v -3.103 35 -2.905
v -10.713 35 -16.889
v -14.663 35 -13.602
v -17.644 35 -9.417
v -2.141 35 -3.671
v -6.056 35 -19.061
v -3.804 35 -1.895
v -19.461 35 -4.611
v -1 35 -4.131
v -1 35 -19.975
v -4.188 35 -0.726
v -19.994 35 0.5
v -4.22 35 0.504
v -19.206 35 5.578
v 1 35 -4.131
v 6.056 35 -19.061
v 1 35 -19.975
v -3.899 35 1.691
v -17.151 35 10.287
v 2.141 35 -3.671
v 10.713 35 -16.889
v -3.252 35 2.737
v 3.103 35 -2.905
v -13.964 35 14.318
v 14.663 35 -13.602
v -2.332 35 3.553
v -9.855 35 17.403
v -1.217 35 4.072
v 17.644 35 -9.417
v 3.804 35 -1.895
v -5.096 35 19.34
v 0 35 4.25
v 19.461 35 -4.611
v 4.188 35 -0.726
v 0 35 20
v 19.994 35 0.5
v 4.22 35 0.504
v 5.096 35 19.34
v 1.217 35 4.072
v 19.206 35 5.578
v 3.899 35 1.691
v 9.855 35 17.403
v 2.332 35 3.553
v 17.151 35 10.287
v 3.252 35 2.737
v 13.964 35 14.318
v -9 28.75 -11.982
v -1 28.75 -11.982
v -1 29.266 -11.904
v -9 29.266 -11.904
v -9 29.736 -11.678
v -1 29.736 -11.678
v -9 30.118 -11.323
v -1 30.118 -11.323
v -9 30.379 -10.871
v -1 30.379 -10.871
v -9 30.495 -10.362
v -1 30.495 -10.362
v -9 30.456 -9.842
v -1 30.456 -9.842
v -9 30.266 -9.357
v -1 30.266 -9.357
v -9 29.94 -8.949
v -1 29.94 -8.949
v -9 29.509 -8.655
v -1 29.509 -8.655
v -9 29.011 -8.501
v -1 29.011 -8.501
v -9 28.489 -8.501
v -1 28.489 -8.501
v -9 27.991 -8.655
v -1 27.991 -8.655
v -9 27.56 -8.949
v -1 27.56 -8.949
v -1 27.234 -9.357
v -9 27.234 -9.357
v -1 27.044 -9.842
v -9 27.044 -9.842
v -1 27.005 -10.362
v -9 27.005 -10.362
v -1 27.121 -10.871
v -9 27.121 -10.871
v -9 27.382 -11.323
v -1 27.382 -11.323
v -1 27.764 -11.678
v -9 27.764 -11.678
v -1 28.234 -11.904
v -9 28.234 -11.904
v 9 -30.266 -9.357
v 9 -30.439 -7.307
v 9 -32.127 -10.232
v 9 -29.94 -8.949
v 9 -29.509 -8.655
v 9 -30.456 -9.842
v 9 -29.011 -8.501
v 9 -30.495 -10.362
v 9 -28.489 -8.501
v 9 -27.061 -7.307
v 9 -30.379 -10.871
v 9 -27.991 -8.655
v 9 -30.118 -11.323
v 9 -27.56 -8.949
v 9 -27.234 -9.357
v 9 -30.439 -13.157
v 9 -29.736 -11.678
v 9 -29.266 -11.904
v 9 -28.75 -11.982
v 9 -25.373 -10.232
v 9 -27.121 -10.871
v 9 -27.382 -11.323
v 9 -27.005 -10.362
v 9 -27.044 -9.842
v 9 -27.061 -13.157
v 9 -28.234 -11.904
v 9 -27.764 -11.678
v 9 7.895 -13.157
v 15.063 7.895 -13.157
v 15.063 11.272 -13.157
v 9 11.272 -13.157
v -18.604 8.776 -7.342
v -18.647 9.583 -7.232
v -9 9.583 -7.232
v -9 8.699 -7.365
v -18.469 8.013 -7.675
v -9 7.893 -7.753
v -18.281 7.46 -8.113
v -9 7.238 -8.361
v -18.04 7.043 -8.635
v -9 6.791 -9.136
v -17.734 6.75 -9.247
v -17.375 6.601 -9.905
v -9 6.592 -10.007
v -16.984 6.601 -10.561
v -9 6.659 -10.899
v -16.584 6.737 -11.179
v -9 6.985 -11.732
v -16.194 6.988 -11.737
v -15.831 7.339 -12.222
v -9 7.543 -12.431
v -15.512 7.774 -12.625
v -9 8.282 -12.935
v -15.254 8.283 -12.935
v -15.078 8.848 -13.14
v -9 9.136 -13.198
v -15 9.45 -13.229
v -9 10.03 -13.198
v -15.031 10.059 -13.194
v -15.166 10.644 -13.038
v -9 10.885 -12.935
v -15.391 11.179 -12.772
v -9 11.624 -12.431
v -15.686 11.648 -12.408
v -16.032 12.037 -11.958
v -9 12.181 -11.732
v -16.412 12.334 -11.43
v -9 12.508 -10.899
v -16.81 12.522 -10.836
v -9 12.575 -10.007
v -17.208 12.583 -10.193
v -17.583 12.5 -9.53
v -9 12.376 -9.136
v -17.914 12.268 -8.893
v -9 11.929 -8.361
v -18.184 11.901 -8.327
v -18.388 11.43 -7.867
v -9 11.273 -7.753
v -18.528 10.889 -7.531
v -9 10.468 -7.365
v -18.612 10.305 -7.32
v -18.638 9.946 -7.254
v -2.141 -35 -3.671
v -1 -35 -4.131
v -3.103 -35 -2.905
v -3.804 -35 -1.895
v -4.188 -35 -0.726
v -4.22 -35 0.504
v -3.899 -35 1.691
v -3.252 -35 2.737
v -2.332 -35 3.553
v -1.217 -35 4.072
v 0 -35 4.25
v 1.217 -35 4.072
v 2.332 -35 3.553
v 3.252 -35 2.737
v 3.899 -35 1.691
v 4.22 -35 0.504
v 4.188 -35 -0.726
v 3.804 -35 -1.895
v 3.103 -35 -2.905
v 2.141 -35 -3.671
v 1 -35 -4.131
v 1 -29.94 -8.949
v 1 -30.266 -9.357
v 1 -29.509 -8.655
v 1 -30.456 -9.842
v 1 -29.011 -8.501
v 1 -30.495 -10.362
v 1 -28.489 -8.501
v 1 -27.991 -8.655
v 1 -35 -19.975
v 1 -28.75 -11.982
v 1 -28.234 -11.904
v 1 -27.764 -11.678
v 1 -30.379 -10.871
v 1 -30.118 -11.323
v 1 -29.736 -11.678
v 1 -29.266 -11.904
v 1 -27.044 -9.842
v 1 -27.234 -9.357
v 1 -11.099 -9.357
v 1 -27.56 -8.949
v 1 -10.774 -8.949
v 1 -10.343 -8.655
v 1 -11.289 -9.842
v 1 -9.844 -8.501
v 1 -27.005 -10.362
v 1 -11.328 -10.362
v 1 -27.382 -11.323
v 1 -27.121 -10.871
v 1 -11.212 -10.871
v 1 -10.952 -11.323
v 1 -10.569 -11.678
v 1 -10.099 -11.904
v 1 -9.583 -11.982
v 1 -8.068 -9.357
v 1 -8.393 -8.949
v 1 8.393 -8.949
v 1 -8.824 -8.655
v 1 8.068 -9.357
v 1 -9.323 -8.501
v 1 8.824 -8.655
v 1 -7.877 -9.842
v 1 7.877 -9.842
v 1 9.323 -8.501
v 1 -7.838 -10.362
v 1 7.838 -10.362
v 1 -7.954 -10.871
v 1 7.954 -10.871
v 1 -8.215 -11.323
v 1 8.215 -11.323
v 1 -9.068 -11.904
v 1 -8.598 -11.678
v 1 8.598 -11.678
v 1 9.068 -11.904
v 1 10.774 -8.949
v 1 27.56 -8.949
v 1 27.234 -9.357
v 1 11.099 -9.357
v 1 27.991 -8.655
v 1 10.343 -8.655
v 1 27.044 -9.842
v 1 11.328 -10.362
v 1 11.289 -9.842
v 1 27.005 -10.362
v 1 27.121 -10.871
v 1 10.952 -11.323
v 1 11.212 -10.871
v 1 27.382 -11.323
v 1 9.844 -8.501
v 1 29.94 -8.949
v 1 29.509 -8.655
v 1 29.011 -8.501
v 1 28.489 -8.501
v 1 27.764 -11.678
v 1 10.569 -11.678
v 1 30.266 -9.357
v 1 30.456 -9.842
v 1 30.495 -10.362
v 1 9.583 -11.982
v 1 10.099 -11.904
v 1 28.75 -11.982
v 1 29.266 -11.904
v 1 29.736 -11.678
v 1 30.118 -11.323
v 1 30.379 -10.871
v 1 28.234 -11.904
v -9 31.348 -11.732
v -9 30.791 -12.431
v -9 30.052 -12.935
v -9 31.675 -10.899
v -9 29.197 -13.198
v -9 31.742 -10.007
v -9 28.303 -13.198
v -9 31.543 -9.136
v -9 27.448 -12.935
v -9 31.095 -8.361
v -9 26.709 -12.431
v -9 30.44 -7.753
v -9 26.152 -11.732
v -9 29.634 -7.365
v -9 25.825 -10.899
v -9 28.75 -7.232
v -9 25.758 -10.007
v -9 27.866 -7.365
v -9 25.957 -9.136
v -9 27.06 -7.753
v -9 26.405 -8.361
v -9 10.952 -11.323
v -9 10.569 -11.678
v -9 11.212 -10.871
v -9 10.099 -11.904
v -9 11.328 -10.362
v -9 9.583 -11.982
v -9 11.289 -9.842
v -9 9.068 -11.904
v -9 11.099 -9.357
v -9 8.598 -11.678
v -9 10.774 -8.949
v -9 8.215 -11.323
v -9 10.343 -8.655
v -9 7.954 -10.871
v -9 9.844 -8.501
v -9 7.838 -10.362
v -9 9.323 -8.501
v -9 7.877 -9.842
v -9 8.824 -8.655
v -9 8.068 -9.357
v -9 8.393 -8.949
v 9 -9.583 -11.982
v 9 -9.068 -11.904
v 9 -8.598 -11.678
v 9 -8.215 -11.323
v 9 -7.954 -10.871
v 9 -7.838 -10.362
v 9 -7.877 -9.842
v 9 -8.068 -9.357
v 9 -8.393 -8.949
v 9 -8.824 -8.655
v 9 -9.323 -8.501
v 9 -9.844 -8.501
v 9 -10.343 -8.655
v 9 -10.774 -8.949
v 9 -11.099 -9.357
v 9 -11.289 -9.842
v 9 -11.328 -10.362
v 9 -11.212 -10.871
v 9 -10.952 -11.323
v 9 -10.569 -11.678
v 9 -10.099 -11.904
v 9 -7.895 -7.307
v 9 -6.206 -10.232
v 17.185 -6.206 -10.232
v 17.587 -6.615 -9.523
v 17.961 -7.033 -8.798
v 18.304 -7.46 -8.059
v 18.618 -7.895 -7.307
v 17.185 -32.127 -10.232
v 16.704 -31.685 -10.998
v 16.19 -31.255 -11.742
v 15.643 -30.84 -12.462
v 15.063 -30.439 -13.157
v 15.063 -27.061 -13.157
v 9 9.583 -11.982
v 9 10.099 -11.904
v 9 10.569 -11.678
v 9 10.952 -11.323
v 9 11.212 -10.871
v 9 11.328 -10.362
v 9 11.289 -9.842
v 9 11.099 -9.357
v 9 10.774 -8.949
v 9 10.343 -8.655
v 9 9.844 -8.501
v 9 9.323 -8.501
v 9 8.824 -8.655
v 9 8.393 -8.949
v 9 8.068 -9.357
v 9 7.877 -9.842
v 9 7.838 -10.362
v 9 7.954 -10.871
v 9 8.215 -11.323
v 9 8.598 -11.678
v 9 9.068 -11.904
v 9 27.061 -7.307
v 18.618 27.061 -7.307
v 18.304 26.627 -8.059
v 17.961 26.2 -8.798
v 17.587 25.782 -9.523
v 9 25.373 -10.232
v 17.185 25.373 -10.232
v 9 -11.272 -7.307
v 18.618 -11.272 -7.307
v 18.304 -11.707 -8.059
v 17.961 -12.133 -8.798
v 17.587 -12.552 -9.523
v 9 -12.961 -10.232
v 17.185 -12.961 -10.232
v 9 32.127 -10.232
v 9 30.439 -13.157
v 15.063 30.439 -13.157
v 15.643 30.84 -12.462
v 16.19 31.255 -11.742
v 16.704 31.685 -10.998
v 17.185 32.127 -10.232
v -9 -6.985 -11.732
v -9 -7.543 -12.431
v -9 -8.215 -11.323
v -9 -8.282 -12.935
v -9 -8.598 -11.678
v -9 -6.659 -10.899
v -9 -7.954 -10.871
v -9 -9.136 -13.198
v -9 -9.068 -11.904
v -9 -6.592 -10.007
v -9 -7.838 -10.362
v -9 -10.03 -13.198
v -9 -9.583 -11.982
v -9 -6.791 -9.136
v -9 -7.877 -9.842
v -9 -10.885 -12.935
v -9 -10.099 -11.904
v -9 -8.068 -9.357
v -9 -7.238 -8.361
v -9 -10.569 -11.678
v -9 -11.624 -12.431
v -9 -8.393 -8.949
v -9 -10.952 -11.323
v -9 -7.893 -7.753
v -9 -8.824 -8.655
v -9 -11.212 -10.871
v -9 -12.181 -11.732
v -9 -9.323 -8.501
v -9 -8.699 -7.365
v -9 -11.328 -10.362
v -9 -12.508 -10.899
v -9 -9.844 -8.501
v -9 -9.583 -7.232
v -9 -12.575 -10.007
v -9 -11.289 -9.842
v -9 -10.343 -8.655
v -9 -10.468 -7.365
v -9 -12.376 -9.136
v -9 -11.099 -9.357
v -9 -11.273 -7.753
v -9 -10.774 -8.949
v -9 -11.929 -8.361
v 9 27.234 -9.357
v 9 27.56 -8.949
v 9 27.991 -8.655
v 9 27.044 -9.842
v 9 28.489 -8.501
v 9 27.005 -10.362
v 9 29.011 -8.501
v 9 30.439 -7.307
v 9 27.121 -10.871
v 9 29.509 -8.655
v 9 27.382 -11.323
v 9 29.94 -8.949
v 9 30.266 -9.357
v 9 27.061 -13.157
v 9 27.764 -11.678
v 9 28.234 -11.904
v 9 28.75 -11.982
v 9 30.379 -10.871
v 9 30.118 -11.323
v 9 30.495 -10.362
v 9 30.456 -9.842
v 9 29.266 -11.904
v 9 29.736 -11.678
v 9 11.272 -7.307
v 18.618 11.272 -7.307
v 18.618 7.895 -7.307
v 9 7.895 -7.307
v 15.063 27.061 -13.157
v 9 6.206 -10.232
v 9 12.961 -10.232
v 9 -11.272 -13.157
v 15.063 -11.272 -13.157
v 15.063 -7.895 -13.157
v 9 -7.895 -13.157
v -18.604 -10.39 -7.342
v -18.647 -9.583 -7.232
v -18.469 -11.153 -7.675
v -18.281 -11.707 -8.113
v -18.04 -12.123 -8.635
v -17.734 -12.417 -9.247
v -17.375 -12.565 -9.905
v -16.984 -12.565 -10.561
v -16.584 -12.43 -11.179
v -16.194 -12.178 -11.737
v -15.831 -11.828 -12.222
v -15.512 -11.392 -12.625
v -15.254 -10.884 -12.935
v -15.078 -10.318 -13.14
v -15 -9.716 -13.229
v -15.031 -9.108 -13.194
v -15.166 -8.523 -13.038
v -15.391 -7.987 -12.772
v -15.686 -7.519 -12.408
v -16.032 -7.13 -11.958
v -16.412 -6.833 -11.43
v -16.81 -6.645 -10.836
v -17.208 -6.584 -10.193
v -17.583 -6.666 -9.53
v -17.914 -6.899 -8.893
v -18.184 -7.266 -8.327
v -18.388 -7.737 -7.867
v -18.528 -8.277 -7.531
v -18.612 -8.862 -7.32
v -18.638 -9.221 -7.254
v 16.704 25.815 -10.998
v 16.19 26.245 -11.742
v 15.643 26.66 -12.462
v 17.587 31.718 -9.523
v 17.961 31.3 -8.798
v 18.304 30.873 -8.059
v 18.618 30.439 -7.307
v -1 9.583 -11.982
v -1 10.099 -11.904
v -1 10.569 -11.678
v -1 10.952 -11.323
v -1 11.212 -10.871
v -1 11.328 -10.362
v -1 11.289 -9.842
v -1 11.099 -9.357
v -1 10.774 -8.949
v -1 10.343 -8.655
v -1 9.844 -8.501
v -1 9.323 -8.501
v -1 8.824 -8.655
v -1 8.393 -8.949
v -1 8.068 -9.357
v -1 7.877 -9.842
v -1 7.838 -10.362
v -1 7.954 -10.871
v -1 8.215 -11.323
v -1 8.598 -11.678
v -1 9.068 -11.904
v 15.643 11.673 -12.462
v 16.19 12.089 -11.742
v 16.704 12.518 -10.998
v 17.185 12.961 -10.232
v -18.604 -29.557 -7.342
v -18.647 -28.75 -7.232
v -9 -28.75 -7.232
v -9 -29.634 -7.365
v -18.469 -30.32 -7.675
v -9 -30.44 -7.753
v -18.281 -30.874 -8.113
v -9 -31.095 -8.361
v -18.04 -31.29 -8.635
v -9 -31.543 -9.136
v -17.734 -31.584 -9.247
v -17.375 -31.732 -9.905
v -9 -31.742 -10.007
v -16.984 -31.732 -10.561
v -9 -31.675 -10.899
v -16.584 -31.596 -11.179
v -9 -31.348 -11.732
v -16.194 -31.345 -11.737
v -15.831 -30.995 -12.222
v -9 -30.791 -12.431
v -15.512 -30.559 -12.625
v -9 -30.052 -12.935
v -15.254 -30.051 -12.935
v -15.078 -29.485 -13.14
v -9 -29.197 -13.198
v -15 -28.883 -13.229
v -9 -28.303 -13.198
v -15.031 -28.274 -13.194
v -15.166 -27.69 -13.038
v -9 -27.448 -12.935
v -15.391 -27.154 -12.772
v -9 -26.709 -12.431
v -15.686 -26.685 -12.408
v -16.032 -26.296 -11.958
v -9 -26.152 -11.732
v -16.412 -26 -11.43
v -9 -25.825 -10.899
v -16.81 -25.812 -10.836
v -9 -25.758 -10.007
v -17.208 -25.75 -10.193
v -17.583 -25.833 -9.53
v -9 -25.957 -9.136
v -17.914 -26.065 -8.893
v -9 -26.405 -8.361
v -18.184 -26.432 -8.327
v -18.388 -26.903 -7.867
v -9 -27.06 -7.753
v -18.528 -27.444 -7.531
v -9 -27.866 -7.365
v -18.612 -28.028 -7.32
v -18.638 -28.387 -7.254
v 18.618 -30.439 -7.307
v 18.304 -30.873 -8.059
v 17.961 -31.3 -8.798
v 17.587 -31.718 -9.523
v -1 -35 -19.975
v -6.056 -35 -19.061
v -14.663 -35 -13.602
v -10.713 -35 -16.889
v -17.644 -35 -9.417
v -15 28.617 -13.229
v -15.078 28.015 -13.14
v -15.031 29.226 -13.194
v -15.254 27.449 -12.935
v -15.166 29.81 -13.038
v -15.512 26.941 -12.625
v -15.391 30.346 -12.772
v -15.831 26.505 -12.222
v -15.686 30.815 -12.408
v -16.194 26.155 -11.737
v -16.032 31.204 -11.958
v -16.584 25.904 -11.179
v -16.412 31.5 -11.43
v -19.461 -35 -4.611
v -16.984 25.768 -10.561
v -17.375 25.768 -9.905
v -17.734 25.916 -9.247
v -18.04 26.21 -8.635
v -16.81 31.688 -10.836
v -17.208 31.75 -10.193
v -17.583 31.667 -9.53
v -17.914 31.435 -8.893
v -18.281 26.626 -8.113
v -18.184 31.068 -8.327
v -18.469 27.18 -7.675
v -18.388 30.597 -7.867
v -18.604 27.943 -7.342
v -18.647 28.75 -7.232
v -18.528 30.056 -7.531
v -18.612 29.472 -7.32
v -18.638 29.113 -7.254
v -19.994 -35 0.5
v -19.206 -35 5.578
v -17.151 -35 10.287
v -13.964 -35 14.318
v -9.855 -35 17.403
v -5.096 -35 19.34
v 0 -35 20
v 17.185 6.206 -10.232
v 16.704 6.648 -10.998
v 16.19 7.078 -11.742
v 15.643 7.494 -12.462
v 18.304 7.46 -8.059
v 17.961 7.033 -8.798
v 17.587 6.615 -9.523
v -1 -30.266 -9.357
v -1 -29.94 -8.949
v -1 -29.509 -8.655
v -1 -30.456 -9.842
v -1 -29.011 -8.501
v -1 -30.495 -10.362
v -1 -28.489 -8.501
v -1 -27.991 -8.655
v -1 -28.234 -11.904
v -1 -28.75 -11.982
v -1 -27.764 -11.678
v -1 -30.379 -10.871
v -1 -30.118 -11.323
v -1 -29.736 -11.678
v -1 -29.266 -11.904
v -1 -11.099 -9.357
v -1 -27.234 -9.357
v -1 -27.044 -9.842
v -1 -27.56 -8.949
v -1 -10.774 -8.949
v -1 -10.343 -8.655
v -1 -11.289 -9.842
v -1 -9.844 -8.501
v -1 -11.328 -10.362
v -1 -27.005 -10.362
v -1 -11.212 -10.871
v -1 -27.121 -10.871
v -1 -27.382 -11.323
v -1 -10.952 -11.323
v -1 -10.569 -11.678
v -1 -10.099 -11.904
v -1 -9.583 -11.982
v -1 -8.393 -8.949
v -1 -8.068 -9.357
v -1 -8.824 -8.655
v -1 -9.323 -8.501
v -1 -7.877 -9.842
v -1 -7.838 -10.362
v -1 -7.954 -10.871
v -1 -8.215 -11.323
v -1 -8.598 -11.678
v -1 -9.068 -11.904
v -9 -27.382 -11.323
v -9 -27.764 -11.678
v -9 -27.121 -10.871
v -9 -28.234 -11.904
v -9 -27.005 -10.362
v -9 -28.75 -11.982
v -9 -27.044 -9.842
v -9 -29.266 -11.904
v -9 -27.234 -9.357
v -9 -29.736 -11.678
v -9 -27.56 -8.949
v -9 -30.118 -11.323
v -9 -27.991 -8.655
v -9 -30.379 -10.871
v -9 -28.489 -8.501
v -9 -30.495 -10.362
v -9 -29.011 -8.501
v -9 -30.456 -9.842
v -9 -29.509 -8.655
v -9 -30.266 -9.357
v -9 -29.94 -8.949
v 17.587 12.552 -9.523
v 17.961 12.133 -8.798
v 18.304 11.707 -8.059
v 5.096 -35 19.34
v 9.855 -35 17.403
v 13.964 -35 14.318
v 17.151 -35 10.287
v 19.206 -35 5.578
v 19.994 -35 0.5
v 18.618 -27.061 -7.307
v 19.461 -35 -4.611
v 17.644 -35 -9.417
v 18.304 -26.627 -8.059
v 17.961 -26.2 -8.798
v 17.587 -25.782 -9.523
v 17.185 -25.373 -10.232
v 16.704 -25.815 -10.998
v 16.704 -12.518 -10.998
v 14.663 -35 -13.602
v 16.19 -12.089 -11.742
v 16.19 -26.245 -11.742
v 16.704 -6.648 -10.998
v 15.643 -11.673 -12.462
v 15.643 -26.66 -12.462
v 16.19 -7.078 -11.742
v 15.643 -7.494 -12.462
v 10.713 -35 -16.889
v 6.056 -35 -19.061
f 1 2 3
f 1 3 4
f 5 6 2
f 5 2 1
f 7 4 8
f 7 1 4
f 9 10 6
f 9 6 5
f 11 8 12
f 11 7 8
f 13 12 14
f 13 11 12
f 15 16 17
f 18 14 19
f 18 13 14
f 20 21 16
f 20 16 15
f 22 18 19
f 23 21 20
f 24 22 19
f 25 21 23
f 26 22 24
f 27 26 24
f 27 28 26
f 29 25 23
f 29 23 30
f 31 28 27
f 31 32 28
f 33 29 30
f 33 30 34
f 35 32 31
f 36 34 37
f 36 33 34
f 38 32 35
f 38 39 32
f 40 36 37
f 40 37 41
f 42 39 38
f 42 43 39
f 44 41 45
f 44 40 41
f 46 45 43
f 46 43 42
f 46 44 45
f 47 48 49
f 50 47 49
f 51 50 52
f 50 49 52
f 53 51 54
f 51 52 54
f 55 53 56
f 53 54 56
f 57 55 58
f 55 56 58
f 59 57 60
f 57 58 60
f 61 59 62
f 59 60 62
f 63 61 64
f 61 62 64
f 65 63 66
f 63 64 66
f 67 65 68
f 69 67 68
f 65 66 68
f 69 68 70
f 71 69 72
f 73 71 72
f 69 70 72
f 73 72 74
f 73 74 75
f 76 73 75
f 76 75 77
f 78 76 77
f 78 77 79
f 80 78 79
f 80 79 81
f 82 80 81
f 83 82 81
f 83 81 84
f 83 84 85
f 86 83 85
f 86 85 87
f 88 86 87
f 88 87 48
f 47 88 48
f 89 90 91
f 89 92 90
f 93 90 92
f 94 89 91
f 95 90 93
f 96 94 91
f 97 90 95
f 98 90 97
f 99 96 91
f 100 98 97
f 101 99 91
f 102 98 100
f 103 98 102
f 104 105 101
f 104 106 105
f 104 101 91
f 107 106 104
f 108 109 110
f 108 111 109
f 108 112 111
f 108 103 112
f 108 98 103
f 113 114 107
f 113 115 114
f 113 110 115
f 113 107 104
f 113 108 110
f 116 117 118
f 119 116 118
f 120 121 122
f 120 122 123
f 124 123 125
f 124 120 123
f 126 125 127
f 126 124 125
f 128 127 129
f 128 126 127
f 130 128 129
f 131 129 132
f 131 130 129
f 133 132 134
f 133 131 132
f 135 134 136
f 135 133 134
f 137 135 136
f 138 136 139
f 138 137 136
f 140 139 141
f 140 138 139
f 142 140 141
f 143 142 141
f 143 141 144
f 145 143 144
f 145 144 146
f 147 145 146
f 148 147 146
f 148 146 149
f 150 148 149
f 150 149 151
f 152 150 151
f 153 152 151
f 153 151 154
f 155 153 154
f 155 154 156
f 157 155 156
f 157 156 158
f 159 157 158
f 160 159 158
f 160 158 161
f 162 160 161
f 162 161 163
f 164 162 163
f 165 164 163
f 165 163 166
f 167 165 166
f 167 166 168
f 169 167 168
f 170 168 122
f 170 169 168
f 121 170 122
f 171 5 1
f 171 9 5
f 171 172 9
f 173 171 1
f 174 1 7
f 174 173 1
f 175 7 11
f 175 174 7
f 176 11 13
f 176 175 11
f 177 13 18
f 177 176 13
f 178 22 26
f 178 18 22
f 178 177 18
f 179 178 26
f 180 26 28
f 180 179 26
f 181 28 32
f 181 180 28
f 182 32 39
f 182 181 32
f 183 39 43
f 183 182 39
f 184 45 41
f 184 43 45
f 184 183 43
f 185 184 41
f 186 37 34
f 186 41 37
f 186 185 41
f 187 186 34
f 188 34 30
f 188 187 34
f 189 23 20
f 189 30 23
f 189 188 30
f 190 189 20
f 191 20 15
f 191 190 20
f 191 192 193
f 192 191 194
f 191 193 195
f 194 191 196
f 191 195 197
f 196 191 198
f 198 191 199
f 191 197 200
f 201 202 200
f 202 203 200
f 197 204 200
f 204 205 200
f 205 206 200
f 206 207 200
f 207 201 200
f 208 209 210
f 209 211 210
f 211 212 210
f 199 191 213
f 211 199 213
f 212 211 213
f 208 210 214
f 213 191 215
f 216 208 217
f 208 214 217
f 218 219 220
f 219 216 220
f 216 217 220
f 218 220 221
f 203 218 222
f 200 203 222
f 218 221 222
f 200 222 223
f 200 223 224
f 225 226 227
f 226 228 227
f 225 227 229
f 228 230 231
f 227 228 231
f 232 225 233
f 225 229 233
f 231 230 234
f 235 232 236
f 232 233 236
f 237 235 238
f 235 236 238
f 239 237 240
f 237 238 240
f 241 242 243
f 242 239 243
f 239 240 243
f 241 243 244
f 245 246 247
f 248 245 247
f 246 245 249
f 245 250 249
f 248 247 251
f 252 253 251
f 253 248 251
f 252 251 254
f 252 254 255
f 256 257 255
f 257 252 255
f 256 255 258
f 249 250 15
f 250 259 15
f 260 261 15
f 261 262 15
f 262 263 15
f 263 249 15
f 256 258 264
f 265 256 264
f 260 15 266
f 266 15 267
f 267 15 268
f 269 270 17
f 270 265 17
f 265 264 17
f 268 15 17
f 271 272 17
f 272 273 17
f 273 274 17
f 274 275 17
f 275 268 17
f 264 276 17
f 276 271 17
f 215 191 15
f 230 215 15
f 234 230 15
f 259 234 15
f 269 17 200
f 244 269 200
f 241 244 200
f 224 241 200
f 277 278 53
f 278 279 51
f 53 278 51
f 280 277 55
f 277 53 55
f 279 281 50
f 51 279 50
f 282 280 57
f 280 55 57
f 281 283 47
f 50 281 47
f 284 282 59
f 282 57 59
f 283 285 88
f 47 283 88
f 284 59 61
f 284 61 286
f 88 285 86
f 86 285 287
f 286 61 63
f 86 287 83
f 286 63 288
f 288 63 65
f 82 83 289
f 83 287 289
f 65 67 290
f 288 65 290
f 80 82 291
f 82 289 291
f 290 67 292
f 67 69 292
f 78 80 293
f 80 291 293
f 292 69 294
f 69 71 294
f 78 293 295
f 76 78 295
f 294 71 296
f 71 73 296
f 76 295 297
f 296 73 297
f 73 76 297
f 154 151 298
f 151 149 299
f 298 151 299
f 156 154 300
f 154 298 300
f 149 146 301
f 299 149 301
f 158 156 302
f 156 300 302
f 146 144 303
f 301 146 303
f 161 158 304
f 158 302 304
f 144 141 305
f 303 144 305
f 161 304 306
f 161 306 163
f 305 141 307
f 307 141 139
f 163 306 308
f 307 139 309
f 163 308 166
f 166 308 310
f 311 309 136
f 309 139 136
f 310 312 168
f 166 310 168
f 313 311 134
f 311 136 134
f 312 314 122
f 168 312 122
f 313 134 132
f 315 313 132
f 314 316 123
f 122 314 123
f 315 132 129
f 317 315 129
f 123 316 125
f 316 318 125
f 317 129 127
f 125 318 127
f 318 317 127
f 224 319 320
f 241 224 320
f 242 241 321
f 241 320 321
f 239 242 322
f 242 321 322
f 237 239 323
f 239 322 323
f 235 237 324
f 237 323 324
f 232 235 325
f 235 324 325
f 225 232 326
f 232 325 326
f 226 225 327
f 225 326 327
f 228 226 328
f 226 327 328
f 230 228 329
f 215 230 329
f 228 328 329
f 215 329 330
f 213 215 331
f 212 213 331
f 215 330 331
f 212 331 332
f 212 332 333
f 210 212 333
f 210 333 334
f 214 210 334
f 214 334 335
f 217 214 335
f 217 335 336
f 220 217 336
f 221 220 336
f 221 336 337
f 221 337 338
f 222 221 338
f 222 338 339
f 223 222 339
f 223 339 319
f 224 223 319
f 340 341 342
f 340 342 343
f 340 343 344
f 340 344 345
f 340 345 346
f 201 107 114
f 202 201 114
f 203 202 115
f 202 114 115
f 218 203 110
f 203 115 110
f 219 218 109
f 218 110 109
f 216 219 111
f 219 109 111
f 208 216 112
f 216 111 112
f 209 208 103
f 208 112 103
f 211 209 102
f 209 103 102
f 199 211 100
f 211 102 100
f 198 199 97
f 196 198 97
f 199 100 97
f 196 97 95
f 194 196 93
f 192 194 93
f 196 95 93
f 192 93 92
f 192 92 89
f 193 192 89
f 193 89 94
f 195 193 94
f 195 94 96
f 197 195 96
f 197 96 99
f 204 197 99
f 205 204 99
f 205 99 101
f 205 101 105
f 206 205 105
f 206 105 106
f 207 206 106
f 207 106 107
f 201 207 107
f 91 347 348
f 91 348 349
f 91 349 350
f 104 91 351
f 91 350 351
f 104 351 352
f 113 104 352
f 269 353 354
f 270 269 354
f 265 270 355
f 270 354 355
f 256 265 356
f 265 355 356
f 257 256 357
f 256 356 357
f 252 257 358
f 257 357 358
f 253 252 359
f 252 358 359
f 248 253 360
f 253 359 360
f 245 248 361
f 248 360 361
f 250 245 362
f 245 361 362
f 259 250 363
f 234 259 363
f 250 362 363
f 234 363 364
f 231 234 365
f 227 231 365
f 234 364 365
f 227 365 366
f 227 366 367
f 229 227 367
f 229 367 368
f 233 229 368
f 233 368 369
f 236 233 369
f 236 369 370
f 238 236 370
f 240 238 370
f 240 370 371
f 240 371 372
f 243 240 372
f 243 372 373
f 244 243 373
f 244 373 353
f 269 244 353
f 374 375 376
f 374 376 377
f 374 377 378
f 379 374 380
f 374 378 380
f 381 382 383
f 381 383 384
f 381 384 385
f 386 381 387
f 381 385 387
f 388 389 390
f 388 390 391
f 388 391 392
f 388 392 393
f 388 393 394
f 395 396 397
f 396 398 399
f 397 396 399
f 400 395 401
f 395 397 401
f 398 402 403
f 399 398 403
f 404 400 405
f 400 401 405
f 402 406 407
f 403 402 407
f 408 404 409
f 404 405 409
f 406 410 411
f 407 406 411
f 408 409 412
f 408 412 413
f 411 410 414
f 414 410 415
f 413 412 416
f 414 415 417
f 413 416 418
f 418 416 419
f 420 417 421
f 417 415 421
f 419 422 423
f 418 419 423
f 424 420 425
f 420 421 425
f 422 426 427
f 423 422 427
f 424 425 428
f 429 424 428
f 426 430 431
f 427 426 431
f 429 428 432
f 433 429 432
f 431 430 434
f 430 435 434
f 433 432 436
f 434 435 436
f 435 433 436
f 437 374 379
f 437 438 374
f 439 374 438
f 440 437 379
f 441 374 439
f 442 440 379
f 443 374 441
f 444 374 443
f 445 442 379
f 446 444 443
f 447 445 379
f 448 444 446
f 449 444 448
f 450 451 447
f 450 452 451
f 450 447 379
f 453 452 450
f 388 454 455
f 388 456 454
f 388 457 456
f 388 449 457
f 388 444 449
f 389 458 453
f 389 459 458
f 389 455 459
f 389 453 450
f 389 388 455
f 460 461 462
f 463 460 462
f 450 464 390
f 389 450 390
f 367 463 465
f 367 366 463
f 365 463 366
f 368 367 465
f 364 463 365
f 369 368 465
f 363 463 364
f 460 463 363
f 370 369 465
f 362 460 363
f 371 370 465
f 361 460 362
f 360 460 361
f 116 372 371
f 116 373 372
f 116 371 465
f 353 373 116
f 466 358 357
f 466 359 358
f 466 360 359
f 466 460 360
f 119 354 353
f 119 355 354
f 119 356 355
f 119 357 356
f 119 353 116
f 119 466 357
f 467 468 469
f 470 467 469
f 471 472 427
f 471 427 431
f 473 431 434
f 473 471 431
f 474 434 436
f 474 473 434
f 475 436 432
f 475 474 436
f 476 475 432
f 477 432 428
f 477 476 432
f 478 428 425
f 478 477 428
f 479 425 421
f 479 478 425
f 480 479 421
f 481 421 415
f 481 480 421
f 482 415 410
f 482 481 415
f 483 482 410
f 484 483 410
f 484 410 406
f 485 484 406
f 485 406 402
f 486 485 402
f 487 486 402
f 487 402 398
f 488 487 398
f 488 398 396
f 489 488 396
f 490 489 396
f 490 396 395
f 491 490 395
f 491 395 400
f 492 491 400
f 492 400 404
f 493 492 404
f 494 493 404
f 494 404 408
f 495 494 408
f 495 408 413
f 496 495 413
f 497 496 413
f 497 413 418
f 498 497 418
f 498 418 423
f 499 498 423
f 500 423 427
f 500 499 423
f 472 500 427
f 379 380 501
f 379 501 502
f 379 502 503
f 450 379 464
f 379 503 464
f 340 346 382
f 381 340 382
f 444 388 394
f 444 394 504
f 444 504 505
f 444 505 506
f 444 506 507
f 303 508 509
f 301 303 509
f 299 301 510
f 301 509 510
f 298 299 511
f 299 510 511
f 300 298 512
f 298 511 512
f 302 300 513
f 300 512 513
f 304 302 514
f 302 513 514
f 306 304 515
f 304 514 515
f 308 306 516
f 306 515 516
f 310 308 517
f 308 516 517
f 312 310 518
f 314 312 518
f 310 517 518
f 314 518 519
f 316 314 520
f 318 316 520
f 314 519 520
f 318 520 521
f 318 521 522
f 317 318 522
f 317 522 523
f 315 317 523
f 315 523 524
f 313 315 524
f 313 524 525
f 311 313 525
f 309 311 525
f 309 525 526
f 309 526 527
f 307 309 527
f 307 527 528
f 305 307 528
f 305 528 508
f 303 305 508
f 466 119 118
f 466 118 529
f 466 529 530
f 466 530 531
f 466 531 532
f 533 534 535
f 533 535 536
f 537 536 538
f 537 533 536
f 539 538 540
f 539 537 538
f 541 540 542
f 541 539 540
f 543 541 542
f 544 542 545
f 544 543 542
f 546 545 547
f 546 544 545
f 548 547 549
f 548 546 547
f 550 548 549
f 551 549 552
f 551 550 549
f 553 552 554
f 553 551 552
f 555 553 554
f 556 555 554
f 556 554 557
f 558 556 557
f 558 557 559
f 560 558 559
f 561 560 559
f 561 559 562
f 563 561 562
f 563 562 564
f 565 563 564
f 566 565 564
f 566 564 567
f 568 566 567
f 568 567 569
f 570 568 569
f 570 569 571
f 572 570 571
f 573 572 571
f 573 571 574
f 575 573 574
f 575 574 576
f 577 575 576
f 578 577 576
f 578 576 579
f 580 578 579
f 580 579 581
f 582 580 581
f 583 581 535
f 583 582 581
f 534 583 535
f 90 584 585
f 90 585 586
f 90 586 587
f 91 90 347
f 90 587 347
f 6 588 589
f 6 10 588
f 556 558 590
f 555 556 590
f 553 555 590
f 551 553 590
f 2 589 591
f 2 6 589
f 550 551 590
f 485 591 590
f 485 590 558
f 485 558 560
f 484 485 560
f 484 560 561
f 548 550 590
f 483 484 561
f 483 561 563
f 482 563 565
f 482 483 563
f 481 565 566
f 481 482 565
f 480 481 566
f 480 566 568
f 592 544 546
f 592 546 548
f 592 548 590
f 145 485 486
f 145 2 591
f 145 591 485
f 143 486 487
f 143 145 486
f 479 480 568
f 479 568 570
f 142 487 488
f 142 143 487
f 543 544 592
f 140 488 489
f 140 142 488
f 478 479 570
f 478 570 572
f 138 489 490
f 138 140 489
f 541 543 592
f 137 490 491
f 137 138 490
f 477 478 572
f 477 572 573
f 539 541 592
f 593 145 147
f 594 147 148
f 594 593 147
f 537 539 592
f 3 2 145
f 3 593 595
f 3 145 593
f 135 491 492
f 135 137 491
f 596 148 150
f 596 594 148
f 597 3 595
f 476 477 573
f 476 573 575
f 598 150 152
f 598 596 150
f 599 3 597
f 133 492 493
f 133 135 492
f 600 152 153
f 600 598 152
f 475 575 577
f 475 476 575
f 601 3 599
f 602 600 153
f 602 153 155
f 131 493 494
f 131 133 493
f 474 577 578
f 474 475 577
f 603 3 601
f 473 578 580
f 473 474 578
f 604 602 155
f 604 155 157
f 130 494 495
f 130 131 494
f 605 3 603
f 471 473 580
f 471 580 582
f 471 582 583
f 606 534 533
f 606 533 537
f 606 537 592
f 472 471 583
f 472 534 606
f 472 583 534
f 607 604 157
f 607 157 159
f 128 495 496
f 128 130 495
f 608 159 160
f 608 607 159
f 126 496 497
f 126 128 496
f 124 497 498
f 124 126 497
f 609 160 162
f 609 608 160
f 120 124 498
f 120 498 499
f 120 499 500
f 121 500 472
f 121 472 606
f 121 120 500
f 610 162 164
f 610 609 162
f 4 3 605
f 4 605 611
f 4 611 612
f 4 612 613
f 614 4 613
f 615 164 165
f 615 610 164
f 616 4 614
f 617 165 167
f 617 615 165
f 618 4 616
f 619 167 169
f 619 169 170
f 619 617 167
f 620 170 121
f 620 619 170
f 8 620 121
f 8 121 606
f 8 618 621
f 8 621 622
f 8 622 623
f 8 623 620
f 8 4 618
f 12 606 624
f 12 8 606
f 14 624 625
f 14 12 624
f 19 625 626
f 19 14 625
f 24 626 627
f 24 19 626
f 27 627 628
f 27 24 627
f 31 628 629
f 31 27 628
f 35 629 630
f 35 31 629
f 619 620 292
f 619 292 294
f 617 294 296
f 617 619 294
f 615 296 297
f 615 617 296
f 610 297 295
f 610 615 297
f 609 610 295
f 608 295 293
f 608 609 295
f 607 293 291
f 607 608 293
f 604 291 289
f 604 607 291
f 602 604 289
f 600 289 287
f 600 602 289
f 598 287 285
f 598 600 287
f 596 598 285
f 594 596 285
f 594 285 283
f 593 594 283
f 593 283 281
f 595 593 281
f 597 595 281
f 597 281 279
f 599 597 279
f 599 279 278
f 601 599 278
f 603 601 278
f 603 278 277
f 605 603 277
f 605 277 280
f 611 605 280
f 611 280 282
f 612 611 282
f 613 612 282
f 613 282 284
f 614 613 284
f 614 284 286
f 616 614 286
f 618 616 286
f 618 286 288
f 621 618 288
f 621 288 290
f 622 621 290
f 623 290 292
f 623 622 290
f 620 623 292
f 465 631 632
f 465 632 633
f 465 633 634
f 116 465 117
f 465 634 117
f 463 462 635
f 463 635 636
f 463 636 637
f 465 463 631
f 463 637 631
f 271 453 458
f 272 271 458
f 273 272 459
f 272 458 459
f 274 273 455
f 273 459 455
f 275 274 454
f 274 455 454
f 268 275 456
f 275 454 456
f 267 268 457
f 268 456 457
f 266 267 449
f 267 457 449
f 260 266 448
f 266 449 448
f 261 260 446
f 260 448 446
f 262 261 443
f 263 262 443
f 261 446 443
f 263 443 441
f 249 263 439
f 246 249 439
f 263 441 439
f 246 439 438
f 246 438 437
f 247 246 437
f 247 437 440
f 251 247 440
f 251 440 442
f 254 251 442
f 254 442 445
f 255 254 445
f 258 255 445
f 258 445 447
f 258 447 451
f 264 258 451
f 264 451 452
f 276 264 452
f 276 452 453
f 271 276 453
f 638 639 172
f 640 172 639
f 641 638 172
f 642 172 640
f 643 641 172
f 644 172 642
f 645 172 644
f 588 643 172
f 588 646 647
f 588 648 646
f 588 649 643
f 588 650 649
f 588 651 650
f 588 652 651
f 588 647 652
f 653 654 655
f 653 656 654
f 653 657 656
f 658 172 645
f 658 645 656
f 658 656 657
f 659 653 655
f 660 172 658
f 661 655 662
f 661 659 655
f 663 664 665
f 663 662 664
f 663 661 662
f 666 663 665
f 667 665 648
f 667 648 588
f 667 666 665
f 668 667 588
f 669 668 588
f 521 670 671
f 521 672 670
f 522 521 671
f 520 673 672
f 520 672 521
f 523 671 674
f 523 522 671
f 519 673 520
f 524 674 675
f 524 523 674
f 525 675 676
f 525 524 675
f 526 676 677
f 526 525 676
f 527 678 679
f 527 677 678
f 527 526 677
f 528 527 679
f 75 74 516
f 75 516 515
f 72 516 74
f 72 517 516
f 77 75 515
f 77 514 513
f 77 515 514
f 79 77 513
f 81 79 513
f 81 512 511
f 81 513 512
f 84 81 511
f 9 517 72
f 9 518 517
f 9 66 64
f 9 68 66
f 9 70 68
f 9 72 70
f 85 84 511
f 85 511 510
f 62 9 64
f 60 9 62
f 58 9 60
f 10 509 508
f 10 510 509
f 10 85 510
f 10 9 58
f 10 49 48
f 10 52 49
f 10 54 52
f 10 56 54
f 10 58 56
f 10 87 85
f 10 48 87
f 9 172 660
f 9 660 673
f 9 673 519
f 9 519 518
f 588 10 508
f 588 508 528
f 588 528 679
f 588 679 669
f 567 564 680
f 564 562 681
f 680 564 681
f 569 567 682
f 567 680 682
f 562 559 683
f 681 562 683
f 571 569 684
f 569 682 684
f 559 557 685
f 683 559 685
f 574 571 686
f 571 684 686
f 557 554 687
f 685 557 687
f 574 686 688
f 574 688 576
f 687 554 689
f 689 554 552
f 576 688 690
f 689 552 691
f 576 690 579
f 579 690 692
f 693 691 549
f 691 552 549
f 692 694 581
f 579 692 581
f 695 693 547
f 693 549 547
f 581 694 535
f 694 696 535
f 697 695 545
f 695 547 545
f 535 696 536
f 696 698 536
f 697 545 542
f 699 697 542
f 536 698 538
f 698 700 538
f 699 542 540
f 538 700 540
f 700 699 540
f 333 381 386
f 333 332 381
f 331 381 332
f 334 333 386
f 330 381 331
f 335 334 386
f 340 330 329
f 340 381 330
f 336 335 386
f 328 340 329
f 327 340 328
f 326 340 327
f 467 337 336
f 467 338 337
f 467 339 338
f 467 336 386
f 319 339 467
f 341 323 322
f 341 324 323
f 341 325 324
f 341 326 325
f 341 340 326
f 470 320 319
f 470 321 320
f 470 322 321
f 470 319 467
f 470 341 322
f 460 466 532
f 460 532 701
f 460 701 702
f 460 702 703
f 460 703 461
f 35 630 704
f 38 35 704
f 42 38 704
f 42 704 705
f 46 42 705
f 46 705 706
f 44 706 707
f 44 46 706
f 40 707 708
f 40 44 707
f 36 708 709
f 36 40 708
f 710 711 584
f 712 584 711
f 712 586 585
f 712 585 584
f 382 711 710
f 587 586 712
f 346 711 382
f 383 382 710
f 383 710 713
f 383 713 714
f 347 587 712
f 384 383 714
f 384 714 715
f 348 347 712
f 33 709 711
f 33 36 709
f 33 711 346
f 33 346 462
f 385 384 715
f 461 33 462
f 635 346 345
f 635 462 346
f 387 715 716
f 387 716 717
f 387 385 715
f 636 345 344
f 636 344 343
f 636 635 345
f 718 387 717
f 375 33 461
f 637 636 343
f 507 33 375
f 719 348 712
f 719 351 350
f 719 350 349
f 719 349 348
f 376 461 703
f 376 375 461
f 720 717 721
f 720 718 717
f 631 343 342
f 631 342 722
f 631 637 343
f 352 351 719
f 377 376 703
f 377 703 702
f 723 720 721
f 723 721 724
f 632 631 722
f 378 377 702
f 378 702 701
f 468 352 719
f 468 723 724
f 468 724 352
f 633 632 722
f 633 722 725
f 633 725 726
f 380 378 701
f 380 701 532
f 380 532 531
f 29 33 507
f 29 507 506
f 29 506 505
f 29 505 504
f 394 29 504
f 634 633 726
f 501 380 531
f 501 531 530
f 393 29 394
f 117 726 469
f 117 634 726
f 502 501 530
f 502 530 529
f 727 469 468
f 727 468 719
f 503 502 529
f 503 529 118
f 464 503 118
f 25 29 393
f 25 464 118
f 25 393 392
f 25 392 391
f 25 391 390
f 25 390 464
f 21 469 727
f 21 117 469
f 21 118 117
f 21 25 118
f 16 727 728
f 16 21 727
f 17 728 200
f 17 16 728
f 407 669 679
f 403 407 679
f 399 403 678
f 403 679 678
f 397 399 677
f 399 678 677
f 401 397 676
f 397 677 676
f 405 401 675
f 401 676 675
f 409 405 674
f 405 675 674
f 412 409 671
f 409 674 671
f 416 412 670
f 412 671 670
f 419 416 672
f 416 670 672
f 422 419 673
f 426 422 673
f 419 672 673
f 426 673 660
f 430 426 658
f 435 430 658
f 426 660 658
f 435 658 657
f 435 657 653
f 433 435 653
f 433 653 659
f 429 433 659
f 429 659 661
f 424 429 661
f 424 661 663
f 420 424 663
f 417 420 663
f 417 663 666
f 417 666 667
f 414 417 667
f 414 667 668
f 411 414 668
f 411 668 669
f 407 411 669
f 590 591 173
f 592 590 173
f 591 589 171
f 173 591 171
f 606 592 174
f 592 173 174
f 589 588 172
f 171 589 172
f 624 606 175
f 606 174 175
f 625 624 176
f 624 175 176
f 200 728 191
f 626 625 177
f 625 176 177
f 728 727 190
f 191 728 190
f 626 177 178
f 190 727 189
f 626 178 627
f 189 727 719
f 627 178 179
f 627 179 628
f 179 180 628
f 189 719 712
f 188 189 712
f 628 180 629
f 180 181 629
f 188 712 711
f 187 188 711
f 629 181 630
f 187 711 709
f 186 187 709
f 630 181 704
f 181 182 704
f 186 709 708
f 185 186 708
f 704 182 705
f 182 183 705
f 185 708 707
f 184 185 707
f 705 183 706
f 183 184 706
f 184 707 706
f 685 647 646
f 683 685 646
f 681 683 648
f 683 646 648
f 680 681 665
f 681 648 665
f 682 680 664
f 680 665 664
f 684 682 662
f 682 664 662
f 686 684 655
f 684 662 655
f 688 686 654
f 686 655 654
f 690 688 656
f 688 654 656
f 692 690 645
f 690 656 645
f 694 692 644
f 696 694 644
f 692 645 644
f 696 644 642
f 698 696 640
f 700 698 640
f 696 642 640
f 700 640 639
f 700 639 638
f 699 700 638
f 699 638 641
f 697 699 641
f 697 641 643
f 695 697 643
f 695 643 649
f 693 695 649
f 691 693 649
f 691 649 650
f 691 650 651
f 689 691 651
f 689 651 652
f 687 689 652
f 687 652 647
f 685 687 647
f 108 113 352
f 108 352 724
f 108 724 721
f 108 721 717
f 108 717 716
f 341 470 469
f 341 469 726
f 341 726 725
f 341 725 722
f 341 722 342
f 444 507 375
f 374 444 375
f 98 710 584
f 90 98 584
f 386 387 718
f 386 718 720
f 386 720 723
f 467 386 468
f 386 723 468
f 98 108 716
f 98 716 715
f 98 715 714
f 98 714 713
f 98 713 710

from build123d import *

# Parameters (mm, degrees)
SKETCH1_R           = 20
SKETCH1_R_2         = 4.25
BOSS_EXTRUDE1_DEPTH = 35
SKETCH2_W           = 2
SKETCH2_H           = 25
CUT_EXTRUDE1_DEPTH  = 35
SKETCH4_R           = 1.75
CUT_EXTRUDE2_DEPTH  = 30
CUT_EXTRUDE3_DEPTH  = 11
SKETCH6_R           = 3
CUT_EXTRUDE4_DEPTH  = 11


with BuildPart() as part:
    # Sketch1 → Boss-Extrude1 (new, symmetric)
    with BuildSketch(Plane(origin=(0, 0, 0), x_dir=(1, 0, 0), z_dir=(0, 1, 0))):
        with Locations(Location((0, 0, 0), (0, 0, 270))):
            Circle(SKETCH1_R)
        with Locations(Location((0, 0, 0), (0, 0, 270))):
            Circle(SKETCH1_R_2, mode=Mode.SUBTRACT)
    extrude(amount=BOSS_EXTRUDE1_DEPTH, both=True)

    # Sketch2 → Cut-Extrude1 (cut, symmetric)
    with BuildSketch(Plane(origin=(0, 0, 0), x_dir=(1, 0, 0), z_dir=(0, 1, 0))):
        with Locations((0, 12.5)):
            Rectangle(SKETCH2_W, SKETCH2_H)
    extrude(amount=CUT_EXTRUDE1_DEPTH, both=True, mode=Mode.SUBTRACT)

    # Sketch4 → Cut-Extrude2 (cut)
    with BuildSketch(Plane(origin=(20, 0, 0), x_dir=(0, 0, -1), z_dir=(1, 0, 0))):
        with Locations((10.231687805, 28.75)):
            Circle(SKETCH4_R)
        with Locations((10.231687805, 9.583333333)):
            Circle(SKETCH4_R)
        with Locations((10.231687805, -9.583333333)):
            Circle(SKETCH4_R)
        with Locations((10.231687805, -28.75)):
            Circle(SKETCH4_R)
    extrude(amount=-CUT_EXTRUDE2_DEPTH, mode=Mode.SUBTRACT)

    # Sketch5 → Cut-Extrude3 (cut)
    with BuildSketch(Plane(origin=(20, 0, 0), x_dir=(0, 0, -1), z_dir=(1, 0, 0))):
        Polygon((10.231687805, 32.127499075), (7.306687805, 30.438749537), (7.306687805, 27.061250463), (10.231687805, 25.372500925), (13.156687805, 27.061250463), (13.156687805, 30.438749537), align=None)
        Polygon((10.231687805, 6.205834259), (13.156687805, 7.894583796), (13.156687805, 11.272082871), (10.231687805, 12.960832408), (7.306687805, 11.272082871), (7.306687805, 7.894583796), align=None)
        Polygon((10.231687805, -12.960832408), (13.156687805, -11.272082871), (13.156687805, -7.894583796), (10.231687805, -6.205834259), (7.306687805, -7.894583796), (7.306687805, -11.272082871), align=None)
        Polygon((10.231687805, -32.127499075), (13.156687805, -30.438749537), (13.156687805, -27.061250463), (10.231687805, -25.372500925), (7.306687805, -27.061250463), (7.306687805, -30.438749537), align=None)
    extrude(amount=-CUT_EXTRUDE3_DEPTH, mode=Mode.SUBTRACT)

    # Sketch6 → Cut-Extrude4 (cut)
    with BuildSketch(Plane(origin=(-20, 0, 0), x_dir=(0, 0, -1), z_dir=(1, 0, 0))):
        with Locations(Location((10.231687805, 28.75, 0), (0, 0, 180))):
            Circle(SKETCH6_R)
        with Locations(Location((10.231687805, 9.583333333, 0), (0, 0, 180))):
            Circle(SKETCH6_R)
        with Locations(Location((10.231687805, -9.583333333, 0), (0, 0, 180))):
            Circle(SKETCH6_R)
        with Locations(Location((10.231687805, -28.75, 0), (0, 0, 180))):
            Circle(SKETCH6_R)
    extrude(amount=CUT_EXTRUDE4_DEPTH, mode=Mode.SUBTRACT)


solid = part.part
